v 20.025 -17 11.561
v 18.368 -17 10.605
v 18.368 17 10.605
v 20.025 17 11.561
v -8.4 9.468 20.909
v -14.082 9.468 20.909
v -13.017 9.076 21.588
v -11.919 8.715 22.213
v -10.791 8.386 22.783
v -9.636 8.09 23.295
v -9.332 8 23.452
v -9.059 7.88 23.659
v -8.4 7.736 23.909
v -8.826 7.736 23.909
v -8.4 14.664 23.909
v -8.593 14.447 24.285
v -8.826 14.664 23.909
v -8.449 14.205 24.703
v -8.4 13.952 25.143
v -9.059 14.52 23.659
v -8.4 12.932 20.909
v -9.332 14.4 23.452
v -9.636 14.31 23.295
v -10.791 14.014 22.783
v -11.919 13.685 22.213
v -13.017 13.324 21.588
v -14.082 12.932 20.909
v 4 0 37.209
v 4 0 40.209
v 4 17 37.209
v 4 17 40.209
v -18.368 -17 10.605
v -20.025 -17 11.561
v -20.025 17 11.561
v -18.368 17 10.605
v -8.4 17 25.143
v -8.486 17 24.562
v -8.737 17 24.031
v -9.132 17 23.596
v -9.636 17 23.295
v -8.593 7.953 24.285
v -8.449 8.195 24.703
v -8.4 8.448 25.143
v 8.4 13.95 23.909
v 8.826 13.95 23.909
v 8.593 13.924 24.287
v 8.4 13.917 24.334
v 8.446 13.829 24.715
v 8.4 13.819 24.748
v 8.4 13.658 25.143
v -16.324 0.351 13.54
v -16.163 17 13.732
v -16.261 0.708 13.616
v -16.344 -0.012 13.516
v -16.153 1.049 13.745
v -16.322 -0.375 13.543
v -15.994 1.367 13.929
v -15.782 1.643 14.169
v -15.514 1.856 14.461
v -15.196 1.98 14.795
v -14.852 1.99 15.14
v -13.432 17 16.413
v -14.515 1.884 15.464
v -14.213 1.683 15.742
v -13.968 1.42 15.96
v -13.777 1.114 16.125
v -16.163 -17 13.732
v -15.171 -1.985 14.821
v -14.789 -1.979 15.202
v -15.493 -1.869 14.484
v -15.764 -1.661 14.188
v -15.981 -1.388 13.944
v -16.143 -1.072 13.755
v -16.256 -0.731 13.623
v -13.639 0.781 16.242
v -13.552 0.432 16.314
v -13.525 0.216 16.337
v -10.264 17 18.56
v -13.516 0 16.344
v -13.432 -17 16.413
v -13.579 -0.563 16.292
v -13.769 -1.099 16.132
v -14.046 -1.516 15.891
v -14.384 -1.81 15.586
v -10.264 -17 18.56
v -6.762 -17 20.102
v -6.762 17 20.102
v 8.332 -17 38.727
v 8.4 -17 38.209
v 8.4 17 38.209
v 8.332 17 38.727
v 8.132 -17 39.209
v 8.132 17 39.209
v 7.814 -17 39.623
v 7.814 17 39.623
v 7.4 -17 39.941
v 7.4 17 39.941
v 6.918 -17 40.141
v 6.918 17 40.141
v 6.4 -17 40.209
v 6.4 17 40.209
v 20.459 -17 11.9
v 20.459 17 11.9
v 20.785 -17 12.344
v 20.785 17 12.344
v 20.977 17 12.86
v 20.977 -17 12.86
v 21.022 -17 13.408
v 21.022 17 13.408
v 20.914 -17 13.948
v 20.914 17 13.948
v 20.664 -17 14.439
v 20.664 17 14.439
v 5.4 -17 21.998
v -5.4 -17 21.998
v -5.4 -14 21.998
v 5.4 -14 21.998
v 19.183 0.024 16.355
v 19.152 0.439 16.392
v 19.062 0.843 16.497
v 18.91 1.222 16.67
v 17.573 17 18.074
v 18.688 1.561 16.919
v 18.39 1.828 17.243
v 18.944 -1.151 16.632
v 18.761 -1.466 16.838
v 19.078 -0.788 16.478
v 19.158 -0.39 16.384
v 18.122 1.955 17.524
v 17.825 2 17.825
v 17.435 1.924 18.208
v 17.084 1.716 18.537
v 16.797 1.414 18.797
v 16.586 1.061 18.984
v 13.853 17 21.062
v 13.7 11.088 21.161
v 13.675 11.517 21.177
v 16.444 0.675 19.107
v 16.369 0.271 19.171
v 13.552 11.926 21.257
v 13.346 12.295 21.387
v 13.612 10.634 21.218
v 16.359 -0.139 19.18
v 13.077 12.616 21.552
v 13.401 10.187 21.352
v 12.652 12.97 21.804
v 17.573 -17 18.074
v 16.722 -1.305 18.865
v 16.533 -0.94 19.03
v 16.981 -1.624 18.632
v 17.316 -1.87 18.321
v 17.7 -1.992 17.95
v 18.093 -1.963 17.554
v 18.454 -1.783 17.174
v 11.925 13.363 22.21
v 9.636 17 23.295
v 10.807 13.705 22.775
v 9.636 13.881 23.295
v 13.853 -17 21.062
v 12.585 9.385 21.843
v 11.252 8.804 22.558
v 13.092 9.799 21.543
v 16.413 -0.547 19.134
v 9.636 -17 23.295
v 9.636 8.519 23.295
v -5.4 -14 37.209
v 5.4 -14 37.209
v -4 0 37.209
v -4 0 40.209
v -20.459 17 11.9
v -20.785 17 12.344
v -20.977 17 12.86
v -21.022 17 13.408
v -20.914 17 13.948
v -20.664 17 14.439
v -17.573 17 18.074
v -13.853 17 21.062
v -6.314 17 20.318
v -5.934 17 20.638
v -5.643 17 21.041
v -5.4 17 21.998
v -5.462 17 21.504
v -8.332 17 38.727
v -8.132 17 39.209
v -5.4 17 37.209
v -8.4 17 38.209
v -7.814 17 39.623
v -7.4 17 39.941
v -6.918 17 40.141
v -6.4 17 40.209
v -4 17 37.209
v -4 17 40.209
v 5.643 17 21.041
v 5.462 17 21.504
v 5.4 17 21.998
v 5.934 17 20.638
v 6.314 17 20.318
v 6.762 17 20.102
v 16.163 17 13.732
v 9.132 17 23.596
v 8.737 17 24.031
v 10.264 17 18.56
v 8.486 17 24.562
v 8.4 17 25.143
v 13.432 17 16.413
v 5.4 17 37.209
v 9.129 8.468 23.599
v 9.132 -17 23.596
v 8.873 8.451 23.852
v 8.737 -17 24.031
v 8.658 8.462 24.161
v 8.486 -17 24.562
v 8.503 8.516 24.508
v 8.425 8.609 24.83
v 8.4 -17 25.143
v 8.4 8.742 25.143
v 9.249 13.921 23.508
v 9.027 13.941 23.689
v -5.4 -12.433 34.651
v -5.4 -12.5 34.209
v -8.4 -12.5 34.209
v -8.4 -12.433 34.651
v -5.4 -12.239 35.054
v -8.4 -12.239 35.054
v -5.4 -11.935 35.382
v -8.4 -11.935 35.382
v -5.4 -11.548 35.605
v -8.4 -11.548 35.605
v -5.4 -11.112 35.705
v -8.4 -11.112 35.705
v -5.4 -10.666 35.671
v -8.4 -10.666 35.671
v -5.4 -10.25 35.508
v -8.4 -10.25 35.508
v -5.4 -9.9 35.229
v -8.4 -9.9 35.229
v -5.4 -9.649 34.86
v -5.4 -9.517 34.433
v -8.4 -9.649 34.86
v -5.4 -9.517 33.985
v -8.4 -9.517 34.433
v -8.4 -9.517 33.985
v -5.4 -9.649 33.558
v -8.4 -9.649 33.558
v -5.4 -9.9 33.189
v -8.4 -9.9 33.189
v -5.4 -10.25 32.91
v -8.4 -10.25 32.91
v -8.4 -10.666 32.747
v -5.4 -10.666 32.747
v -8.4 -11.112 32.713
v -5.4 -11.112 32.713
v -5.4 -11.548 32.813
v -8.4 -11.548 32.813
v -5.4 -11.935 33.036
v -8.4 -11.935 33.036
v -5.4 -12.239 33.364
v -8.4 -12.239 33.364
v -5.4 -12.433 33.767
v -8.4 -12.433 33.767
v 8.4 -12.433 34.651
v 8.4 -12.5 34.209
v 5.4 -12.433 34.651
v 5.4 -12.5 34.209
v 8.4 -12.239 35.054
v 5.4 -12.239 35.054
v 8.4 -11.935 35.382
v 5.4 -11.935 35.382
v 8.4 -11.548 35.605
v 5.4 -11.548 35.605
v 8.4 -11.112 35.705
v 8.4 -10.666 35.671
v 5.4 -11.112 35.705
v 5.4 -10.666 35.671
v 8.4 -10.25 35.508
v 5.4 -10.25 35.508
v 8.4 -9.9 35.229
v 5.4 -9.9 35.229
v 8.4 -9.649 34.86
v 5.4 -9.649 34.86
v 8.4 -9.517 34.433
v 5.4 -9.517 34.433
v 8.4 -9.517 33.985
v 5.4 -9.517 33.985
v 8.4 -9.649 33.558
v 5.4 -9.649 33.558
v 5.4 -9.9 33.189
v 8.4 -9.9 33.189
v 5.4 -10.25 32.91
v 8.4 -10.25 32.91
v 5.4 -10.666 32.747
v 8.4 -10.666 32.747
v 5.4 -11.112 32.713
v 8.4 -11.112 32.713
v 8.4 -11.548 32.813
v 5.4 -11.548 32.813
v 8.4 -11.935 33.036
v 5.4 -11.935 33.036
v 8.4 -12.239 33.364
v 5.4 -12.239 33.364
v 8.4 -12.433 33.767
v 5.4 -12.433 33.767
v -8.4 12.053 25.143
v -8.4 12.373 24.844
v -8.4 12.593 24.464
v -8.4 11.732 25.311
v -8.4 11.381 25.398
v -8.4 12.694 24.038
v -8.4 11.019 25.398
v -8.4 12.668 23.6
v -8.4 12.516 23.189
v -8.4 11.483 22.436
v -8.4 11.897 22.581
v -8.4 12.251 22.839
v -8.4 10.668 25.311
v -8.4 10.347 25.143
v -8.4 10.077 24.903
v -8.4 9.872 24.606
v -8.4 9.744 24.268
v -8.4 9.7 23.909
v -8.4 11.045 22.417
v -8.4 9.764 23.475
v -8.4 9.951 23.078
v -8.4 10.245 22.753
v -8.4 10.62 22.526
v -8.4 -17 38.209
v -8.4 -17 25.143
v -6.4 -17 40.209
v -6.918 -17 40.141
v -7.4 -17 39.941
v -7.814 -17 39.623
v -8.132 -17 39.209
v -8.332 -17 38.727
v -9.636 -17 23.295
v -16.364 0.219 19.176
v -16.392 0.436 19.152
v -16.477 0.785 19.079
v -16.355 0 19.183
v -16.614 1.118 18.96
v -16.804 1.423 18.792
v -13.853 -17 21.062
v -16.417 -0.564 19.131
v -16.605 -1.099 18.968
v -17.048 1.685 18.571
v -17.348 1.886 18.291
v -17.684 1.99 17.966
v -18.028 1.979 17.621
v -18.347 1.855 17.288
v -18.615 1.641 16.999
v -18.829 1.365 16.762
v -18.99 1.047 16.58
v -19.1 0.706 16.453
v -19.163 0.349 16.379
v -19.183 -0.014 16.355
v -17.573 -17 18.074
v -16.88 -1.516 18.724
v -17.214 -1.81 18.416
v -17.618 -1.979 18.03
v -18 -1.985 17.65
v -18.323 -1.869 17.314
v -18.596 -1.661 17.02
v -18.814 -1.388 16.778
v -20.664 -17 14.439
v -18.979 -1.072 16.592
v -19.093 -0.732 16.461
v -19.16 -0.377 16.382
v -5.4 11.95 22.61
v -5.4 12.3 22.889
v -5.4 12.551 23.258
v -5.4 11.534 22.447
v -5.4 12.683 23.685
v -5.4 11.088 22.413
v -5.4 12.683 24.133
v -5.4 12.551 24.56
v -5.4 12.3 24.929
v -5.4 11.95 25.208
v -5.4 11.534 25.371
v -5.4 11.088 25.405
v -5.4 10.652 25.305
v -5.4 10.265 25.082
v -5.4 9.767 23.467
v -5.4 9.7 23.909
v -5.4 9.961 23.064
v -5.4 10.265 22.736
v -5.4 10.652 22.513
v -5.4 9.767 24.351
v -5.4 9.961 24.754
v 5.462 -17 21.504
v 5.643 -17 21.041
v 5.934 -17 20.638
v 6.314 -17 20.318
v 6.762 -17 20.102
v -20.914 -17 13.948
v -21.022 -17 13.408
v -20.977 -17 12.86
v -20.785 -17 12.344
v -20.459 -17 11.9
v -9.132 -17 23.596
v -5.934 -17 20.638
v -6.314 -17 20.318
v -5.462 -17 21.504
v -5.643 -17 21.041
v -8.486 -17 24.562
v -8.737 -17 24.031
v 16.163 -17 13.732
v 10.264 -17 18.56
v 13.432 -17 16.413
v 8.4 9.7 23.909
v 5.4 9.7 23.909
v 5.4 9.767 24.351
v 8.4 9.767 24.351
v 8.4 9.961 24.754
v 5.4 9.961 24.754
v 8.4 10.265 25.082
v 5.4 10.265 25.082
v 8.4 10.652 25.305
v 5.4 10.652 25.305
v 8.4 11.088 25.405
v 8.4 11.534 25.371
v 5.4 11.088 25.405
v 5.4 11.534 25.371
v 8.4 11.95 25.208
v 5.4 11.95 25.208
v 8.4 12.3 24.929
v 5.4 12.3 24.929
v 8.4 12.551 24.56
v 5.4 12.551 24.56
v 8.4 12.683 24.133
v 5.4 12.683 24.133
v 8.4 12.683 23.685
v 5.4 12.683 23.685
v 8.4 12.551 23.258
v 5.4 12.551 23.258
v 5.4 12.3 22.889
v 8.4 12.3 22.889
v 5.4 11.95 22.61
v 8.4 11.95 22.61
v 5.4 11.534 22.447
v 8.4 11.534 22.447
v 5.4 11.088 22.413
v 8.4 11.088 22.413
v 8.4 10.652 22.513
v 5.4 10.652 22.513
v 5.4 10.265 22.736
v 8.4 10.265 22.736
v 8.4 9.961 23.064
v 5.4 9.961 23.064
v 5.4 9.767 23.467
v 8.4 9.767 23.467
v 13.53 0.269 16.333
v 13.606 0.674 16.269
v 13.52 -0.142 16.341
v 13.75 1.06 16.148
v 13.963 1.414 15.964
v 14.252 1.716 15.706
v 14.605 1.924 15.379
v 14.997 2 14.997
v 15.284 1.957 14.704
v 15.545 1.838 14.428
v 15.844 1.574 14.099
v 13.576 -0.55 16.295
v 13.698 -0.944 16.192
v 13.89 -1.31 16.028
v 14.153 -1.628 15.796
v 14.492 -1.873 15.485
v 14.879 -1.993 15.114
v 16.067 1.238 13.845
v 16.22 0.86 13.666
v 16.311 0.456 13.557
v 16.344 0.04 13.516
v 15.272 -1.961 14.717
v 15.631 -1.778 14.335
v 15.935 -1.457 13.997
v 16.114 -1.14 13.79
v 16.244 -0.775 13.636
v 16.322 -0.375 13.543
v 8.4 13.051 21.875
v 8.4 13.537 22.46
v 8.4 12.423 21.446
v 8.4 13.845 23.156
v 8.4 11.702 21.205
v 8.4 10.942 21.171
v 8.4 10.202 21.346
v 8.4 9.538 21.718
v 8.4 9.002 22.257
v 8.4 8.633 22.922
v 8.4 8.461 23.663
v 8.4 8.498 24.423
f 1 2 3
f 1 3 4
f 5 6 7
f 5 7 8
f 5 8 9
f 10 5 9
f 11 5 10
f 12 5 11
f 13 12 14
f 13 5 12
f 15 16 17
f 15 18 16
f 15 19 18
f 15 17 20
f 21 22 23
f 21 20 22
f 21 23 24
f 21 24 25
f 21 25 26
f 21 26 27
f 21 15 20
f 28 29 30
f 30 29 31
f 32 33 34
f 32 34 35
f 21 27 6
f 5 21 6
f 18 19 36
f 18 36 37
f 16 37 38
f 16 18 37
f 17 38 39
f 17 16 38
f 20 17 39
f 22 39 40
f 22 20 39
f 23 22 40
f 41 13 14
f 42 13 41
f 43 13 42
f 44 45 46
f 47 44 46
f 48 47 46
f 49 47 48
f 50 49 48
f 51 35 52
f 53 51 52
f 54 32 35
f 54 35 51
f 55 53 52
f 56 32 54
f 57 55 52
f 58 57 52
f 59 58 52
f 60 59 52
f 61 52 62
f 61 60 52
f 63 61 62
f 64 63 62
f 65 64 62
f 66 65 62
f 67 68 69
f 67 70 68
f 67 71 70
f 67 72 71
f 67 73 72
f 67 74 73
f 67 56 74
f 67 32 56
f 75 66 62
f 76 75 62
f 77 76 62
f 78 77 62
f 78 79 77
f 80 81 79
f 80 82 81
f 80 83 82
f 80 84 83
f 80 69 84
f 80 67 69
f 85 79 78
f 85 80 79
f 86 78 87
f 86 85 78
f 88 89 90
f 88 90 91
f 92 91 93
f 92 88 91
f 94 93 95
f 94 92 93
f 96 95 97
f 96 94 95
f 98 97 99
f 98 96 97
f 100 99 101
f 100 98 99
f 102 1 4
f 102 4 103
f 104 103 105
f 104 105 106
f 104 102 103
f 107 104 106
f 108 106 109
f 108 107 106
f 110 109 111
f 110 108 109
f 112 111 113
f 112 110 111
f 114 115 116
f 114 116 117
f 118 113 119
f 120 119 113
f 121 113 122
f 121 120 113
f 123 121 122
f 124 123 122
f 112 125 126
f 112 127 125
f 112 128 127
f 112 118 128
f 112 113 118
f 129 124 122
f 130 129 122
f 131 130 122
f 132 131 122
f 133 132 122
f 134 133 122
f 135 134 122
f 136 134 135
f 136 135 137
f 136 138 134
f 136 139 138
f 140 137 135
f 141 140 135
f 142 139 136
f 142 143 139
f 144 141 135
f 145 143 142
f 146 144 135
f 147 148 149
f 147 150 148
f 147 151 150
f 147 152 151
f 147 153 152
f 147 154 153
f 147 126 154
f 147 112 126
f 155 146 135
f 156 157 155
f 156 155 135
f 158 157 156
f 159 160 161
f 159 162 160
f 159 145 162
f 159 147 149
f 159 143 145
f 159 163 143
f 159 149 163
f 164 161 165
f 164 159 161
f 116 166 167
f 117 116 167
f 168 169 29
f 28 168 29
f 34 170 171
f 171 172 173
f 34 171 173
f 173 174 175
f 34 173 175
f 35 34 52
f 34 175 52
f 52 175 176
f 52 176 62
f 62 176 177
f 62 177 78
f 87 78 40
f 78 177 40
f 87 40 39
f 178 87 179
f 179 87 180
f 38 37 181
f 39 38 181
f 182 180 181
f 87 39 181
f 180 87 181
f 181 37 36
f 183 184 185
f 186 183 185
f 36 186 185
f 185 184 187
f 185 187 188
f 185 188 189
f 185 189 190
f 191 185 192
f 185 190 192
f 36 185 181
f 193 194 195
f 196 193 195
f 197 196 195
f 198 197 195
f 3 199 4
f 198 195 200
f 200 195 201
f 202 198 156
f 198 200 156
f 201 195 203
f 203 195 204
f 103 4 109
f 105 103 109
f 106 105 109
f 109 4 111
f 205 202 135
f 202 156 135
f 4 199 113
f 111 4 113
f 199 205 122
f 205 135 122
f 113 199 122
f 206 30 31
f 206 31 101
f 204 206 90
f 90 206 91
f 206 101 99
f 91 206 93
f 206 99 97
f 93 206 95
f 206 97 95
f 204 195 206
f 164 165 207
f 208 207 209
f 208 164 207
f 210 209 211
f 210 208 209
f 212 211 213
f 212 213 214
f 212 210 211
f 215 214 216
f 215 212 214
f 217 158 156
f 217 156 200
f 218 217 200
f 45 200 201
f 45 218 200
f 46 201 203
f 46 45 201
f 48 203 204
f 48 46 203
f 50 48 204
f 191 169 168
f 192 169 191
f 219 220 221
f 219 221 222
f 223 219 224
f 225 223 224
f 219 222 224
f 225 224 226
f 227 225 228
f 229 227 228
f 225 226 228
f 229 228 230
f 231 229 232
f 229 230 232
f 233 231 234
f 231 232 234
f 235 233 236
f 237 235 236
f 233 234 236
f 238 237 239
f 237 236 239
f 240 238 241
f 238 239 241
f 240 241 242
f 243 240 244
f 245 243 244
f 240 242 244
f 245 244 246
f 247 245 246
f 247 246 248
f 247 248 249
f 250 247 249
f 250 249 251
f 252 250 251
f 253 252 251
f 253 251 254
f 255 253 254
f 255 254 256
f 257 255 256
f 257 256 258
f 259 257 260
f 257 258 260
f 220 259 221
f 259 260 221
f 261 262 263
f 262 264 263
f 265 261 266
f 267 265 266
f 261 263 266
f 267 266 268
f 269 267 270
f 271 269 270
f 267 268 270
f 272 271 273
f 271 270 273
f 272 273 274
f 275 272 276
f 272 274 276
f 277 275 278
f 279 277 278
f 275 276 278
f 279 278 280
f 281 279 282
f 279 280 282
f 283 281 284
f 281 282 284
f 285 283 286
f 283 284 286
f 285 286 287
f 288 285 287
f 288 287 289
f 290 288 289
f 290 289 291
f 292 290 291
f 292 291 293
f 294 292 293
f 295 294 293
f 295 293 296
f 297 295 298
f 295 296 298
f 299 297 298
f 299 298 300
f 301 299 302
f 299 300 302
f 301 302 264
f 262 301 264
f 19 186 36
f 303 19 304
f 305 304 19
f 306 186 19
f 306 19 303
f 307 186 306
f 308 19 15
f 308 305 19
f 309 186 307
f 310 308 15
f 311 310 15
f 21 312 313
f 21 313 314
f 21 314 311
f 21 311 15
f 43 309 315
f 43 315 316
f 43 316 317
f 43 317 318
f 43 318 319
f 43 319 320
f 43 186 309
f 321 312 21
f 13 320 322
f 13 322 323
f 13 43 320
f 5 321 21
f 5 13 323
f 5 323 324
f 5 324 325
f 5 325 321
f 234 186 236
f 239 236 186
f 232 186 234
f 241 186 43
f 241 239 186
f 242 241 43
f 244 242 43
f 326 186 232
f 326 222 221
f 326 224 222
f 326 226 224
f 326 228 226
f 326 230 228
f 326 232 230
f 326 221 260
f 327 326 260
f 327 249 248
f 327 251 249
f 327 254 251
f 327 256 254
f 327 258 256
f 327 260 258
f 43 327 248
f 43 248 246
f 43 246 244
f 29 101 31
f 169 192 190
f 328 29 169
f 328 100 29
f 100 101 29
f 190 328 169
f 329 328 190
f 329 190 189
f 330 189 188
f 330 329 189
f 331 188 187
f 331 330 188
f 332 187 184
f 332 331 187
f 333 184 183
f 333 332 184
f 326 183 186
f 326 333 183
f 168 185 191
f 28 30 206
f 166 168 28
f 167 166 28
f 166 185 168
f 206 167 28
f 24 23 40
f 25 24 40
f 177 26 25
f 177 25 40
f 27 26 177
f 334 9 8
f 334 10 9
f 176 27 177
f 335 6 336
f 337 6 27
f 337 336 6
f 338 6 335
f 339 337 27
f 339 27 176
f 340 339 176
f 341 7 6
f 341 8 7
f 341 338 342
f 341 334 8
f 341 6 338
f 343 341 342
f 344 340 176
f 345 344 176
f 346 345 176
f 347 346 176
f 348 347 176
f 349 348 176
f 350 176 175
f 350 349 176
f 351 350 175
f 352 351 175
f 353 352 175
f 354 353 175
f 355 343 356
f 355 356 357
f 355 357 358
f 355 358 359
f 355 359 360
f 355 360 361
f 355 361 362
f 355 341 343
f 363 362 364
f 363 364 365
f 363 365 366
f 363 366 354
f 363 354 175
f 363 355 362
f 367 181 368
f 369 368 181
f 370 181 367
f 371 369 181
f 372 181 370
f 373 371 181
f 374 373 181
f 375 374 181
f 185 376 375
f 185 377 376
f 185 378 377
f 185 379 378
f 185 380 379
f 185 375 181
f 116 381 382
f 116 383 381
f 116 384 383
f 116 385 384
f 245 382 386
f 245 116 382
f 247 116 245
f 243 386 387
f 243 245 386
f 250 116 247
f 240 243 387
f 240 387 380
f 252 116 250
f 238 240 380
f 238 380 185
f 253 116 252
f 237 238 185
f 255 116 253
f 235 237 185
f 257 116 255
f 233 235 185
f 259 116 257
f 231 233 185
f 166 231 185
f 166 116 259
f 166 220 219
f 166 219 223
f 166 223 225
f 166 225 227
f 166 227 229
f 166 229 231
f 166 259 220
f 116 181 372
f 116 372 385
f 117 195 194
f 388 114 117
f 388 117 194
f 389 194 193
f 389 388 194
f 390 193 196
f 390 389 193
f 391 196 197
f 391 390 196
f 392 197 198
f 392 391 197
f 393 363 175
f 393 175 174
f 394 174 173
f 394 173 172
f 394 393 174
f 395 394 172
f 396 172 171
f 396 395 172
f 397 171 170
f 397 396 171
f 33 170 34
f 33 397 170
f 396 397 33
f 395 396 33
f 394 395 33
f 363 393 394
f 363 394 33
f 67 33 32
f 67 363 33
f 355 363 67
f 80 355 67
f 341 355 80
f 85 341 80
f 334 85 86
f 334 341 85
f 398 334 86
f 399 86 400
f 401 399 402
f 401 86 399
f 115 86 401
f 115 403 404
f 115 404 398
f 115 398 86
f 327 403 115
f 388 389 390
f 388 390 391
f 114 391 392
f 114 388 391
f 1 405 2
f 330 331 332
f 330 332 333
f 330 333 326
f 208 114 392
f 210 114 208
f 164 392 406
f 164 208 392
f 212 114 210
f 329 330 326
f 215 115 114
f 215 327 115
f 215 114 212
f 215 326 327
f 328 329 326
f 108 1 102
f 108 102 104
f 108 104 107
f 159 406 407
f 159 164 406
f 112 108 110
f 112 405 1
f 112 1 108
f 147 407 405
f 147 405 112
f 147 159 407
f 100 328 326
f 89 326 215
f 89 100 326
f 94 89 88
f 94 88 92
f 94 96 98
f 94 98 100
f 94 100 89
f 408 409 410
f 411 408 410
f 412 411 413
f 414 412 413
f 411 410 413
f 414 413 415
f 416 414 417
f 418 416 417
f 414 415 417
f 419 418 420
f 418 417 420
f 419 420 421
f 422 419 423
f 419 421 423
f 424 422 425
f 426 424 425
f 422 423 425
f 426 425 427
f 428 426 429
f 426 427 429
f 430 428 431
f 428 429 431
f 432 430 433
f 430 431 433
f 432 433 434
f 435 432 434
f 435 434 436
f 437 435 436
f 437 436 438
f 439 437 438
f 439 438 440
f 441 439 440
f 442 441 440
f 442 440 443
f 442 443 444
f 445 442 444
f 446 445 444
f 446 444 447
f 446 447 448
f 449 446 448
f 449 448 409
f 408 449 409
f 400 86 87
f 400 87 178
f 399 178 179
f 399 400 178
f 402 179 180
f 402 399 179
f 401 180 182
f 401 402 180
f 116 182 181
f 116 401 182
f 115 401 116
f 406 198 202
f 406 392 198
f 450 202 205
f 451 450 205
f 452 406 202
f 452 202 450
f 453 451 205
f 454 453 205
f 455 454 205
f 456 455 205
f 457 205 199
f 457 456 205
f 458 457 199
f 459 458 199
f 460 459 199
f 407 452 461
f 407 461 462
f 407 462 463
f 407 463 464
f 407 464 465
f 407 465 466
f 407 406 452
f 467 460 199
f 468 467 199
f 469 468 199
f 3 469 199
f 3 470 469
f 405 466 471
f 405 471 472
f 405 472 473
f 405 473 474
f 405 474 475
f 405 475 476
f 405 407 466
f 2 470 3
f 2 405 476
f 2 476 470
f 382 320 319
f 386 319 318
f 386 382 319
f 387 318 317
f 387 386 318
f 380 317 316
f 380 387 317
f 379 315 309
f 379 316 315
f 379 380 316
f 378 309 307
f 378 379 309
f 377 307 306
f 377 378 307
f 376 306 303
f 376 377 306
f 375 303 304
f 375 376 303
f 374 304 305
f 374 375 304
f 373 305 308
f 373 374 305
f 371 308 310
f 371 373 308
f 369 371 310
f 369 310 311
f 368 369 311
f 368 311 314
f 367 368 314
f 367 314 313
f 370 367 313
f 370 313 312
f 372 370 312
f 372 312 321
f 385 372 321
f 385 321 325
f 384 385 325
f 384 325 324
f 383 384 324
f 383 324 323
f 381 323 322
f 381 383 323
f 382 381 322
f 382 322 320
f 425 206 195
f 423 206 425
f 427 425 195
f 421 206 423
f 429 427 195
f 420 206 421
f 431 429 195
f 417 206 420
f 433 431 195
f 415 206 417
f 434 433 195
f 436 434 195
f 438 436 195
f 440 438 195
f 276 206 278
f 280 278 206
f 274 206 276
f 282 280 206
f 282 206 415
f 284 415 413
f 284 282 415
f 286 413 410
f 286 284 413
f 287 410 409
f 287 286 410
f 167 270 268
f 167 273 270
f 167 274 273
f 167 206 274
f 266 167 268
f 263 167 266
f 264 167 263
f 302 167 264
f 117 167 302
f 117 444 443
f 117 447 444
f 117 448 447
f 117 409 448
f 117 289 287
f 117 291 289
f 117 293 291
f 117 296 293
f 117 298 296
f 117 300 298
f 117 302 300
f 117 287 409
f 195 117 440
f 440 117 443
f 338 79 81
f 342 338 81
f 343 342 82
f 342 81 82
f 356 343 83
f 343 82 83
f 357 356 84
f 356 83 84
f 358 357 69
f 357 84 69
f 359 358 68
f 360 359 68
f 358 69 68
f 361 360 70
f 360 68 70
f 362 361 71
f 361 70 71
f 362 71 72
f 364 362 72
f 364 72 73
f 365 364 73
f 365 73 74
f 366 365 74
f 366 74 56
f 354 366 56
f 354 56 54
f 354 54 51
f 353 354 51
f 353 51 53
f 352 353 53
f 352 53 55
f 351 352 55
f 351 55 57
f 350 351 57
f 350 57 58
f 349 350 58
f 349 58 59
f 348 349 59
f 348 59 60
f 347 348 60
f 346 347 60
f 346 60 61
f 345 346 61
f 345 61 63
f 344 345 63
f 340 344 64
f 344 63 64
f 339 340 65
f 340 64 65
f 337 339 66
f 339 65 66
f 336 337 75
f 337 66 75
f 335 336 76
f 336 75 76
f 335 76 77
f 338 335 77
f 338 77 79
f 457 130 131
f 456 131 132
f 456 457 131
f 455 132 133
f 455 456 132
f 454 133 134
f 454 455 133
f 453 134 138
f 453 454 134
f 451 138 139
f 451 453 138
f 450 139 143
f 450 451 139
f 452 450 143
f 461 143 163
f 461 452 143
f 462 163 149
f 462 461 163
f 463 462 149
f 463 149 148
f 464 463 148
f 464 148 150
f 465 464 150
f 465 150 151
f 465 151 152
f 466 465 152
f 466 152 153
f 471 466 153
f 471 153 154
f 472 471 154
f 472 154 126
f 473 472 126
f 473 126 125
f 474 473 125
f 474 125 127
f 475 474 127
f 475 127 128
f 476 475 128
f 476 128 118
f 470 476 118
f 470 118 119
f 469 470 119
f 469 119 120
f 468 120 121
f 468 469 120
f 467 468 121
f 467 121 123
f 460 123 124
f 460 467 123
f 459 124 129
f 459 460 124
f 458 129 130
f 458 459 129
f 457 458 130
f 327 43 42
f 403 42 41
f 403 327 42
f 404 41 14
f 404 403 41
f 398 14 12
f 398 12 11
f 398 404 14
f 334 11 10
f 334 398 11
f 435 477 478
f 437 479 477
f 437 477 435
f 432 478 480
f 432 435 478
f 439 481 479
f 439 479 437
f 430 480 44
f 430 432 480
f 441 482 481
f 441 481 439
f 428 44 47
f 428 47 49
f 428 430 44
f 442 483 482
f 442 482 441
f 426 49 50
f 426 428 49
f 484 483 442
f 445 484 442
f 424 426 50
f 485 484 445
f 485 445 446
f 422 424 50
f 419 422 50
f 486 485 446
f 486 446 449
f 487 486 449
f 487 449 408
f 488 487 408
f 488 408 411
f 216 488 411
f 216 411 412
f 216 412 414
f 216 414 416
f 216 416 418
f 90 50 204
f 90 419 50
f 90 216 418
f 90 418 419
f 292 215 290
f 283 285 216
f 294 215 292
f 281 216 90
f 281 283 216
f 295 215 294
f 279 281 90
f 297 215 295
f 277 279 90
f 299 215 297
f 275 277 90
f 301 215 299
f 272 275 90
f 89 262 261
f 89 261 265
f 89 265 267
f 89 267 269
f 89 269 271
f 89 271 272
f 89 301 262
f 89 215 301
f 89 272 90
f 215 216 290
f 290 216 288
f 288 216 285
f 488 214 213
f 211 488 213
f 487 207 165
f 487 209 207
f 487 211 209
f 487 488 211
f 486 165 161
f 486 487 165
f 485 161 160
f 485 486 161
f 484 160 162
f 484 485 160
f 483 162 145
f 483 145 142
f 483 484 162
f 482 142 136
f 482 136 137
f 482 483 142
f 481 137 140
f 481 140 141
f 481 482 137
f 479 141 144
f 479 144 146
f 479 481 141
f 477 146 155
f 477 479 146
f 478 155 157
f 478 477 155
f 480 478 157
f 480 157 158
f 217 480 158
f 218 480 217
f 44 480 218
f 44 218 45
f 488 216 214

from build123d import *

# Parameters (mm, degrees)
F1_DEPTH  = 17
F2_W      = 10.8
F2_H      = 15.2113255547
F3_DEPTH  = 3
F4_R      = 1.5
F5_DEPTH  = 20
F8_R      = 2
F9_DEPTH  = 43.2998466183
F11_R     = 2
F12_DEPTH = 43.2998466183
F15_DEPTH = 25
F17_DEPTH = 25
F13_W     = 8
F13_H     = 17
F18_DEPTH = 25


with BuildPart() as f1:
    # F0 (on Front) → F1 (new body, symmetric)
    with BuildSketch(Plane.XZ):
        with BuildLine():
            ThreePointArc((6.7623163428, 20.1020585682), (13.4323577243, 16.4132095267), (18.3675327889, 10.6045))
            Line((18.3675327889, 10.6045), (20.0248161228, 11.5613329789))
            ThreePointArc((20.0248161228, 11.5613329789), (20.9771944934, 12.8595419977), (20.6642504907, 14.4389207581))
            ThreePointArc((20.6642504907, 14.4389207581), (15.7837350444, 19.6562302858), (9.6355470616, 23.2948473664))
            ThreePointArc((9.6355470616, 23.2948473664), (8.7373355906, 24.0314330814), (8.4, 25.1429847274))
            Line((8.4, 25.1429847274), (8.4, 38.209))
            ThreePointArc((8.4, 38.209), (7.8142135624, 39.6232135624), (6.4, 40.209))
            Line((6.4, 40.209), (-6.4, 40.209))
            ThreePointArc((-6.4, 40.209), (-7.8142135624, 39.6232135624), (-8.4, 38.209))
            Line((-8.4, 38.209), (-8.4, 25.1429847274))
            ThreePointArc((-8.4, 25.1429847274), (-8.7373355906, 24.0314330814), (-9.6355470616, 23.2948473664))
            ThreePointArc((-9.6355470616, 23.2948473664), (-15.7837350444, 19.6562302858), (-20.6642504907, 14.4389207581))
            ThreePointArc((-20.6642504907, 14.4389207581), (-20.9771944934, 12.8595419977), (-20.0248161228, 11.5613329789))
            Line((-20.0248161228, 11.5613329789), (-18.3675327889, 10.6045))
            ThreePointArc((-18.3675327889, 10.6045), (-13.4323577243, 16.4132095267), (-6.7623163428, 20.1020585682))
            ThreePointArc((-6.7623163428, 20.1020585682), (-5.7759052807, 20.830491365), (-5.4, 21.9976744453))
            Line((-5.4, 21.9976744453), (-5.4, 37.209))
            Line((-5.4, 37.209), (5.4, 37.209))
            Line((5.4, 37.209), (5.4, 21.9976744453))
            ThreePointArc((5.4, 21.9976744453), (5.7759052807, 20.830491365), (6.7623163428, 20.1020585682))
        make_face()
    extrude(amount=F1_DEPTH, both=True)

    # F2 (on face) → F3 (join)
    with BuildSketch(Plane.XZ.offset(17)):
        with Locations((0, 29.6033372226)):
            Rectangle(F2_W, F2_H)
    extrude(amount=-F3_DEPTH)

    # F4 (on face) → F5 (cut, symmetric)
    with BuildSketch(Plane(origin=(5.4, 0, 0), x_dir=(0, -1, 0), z_dir=(-1, 0, 0))):
        with Locations((-11.2, 23.909)):
            Circle(F4_R)
        with Locations((11, 34.209)):
            Circle(F4_R)
    extrude(amount=F5_DEPTH, both=True, mode=Mode.SUBTRACT)

    # F8 (on line) → F9 (cut, through all)
    with BuildSketch(Plane(origin=(0, 0, 0), x_dir=(0.7071067812, 0, 0.7071067812), z_dir=(0.7071067812, 0, -0.7071067812))):
        Circle(F8_R)
    extrude(amount=-F9_DEPTH, mode=Mode.SUBTRACT)

    # F11 (on line) → F12 (cut, through all)
    with BuildSketch(Plane(origin=(0, 0, 0), x_dir=(0, 1, 0), z_dir=(0.7071067812, 0, 0.7071067812))):
        Circle(F11_R)
    extrude(amount=F12_DEPTH, mode=Mode.SUBTRACT)

    # F14 (on face) → F15 (cut)
    with BuildSketch(Plane.YZ.offset(8.4)):
        with BuildLine():
            Line((12.0528081218, 25.1429847274), (13.6575967311, 25.1429847274))
            ThreePointArc((13.6575967311, 25.1429847274), (11.2, 26.659), (8.7424032689, 25.1429847274))
            Line((8.7424032689, 25.1429847274), (10.3471918782, 25.1429847274))
            ThreePointArc((10.3471918782, 25.1429847274), (11.2, 25.409), (12.0528081218, 25.1429847274))
        make_face()
        with BuildLine():
            ThreePointArc((8.7424032689, 25.1429847274), (10.5659223275, 21.2330991227), (13.95, 23.909))
            ThreePointArc((13.95, 23.909), (13.8759008773, 24.5430776725), (13.6575967311, 25.1429847274))
            Line((13.6575967311, 25.1429847274), (12.0528081218, 25.1429847274))
            ThreePointArc((12.0528081218, 25.1429847274), (11.2, 25.409), (10.3471918782, 25.1429847274))
            Line((10.3471918782, 25.1429847274), (8.7424032689, 25.1429847274))
        make_face()
    extrude(amount=F15_DEPTH, mode=Mode.SUBTRACT)

    # F16 (on face) → F17 (cut)
    with BuildSketch(Plane(origin=(-8.4, 0, 0), x_dir=(0, -1, 0), z_dir=(-1, 0, 0))):
        with BuildLine():
            Line((-12.0528081218, 25.1429847274), (-13.9516602006, 25.1429847274))
            Line((-13.9516602006, 25.1429847274), (-14.6641016151, 23.909))
            Line((-14.6641016151, 23.909), (-12.9320508076, 20.909))
            Line((-12.9320508076, 20.909), (-9.4679491924, 20.909))
            Line((-9.4679491924, 20.909), (-7.7358983849, 23.909))
            Line((-7.7358983849, 23.909), (-8.4483397994, 25.1429847274))
            Line((-8.4483397994, 25.1429847274), (-10.3471918782, 25.1429847274))
            ThreePointArc((-10.3471918782, 25.1429847274), (-11.2, 25.409), (-12.0528081218, 25.1429847274))
        make_face()
    extrude(amount=F17_DEPTH, mode=Mode.SUBTRACT)

    # F13 (on face) → F18 (cut)
    with BuildSketch(Plane.XY.offset(40.209)):
        with Locations((0, 8.5)):
            Rectangle(F13_W, F13_H)
    extrude(amount=-F18_DEPTH, mode=Mode.SUBTRACT)


solid = f1.part
